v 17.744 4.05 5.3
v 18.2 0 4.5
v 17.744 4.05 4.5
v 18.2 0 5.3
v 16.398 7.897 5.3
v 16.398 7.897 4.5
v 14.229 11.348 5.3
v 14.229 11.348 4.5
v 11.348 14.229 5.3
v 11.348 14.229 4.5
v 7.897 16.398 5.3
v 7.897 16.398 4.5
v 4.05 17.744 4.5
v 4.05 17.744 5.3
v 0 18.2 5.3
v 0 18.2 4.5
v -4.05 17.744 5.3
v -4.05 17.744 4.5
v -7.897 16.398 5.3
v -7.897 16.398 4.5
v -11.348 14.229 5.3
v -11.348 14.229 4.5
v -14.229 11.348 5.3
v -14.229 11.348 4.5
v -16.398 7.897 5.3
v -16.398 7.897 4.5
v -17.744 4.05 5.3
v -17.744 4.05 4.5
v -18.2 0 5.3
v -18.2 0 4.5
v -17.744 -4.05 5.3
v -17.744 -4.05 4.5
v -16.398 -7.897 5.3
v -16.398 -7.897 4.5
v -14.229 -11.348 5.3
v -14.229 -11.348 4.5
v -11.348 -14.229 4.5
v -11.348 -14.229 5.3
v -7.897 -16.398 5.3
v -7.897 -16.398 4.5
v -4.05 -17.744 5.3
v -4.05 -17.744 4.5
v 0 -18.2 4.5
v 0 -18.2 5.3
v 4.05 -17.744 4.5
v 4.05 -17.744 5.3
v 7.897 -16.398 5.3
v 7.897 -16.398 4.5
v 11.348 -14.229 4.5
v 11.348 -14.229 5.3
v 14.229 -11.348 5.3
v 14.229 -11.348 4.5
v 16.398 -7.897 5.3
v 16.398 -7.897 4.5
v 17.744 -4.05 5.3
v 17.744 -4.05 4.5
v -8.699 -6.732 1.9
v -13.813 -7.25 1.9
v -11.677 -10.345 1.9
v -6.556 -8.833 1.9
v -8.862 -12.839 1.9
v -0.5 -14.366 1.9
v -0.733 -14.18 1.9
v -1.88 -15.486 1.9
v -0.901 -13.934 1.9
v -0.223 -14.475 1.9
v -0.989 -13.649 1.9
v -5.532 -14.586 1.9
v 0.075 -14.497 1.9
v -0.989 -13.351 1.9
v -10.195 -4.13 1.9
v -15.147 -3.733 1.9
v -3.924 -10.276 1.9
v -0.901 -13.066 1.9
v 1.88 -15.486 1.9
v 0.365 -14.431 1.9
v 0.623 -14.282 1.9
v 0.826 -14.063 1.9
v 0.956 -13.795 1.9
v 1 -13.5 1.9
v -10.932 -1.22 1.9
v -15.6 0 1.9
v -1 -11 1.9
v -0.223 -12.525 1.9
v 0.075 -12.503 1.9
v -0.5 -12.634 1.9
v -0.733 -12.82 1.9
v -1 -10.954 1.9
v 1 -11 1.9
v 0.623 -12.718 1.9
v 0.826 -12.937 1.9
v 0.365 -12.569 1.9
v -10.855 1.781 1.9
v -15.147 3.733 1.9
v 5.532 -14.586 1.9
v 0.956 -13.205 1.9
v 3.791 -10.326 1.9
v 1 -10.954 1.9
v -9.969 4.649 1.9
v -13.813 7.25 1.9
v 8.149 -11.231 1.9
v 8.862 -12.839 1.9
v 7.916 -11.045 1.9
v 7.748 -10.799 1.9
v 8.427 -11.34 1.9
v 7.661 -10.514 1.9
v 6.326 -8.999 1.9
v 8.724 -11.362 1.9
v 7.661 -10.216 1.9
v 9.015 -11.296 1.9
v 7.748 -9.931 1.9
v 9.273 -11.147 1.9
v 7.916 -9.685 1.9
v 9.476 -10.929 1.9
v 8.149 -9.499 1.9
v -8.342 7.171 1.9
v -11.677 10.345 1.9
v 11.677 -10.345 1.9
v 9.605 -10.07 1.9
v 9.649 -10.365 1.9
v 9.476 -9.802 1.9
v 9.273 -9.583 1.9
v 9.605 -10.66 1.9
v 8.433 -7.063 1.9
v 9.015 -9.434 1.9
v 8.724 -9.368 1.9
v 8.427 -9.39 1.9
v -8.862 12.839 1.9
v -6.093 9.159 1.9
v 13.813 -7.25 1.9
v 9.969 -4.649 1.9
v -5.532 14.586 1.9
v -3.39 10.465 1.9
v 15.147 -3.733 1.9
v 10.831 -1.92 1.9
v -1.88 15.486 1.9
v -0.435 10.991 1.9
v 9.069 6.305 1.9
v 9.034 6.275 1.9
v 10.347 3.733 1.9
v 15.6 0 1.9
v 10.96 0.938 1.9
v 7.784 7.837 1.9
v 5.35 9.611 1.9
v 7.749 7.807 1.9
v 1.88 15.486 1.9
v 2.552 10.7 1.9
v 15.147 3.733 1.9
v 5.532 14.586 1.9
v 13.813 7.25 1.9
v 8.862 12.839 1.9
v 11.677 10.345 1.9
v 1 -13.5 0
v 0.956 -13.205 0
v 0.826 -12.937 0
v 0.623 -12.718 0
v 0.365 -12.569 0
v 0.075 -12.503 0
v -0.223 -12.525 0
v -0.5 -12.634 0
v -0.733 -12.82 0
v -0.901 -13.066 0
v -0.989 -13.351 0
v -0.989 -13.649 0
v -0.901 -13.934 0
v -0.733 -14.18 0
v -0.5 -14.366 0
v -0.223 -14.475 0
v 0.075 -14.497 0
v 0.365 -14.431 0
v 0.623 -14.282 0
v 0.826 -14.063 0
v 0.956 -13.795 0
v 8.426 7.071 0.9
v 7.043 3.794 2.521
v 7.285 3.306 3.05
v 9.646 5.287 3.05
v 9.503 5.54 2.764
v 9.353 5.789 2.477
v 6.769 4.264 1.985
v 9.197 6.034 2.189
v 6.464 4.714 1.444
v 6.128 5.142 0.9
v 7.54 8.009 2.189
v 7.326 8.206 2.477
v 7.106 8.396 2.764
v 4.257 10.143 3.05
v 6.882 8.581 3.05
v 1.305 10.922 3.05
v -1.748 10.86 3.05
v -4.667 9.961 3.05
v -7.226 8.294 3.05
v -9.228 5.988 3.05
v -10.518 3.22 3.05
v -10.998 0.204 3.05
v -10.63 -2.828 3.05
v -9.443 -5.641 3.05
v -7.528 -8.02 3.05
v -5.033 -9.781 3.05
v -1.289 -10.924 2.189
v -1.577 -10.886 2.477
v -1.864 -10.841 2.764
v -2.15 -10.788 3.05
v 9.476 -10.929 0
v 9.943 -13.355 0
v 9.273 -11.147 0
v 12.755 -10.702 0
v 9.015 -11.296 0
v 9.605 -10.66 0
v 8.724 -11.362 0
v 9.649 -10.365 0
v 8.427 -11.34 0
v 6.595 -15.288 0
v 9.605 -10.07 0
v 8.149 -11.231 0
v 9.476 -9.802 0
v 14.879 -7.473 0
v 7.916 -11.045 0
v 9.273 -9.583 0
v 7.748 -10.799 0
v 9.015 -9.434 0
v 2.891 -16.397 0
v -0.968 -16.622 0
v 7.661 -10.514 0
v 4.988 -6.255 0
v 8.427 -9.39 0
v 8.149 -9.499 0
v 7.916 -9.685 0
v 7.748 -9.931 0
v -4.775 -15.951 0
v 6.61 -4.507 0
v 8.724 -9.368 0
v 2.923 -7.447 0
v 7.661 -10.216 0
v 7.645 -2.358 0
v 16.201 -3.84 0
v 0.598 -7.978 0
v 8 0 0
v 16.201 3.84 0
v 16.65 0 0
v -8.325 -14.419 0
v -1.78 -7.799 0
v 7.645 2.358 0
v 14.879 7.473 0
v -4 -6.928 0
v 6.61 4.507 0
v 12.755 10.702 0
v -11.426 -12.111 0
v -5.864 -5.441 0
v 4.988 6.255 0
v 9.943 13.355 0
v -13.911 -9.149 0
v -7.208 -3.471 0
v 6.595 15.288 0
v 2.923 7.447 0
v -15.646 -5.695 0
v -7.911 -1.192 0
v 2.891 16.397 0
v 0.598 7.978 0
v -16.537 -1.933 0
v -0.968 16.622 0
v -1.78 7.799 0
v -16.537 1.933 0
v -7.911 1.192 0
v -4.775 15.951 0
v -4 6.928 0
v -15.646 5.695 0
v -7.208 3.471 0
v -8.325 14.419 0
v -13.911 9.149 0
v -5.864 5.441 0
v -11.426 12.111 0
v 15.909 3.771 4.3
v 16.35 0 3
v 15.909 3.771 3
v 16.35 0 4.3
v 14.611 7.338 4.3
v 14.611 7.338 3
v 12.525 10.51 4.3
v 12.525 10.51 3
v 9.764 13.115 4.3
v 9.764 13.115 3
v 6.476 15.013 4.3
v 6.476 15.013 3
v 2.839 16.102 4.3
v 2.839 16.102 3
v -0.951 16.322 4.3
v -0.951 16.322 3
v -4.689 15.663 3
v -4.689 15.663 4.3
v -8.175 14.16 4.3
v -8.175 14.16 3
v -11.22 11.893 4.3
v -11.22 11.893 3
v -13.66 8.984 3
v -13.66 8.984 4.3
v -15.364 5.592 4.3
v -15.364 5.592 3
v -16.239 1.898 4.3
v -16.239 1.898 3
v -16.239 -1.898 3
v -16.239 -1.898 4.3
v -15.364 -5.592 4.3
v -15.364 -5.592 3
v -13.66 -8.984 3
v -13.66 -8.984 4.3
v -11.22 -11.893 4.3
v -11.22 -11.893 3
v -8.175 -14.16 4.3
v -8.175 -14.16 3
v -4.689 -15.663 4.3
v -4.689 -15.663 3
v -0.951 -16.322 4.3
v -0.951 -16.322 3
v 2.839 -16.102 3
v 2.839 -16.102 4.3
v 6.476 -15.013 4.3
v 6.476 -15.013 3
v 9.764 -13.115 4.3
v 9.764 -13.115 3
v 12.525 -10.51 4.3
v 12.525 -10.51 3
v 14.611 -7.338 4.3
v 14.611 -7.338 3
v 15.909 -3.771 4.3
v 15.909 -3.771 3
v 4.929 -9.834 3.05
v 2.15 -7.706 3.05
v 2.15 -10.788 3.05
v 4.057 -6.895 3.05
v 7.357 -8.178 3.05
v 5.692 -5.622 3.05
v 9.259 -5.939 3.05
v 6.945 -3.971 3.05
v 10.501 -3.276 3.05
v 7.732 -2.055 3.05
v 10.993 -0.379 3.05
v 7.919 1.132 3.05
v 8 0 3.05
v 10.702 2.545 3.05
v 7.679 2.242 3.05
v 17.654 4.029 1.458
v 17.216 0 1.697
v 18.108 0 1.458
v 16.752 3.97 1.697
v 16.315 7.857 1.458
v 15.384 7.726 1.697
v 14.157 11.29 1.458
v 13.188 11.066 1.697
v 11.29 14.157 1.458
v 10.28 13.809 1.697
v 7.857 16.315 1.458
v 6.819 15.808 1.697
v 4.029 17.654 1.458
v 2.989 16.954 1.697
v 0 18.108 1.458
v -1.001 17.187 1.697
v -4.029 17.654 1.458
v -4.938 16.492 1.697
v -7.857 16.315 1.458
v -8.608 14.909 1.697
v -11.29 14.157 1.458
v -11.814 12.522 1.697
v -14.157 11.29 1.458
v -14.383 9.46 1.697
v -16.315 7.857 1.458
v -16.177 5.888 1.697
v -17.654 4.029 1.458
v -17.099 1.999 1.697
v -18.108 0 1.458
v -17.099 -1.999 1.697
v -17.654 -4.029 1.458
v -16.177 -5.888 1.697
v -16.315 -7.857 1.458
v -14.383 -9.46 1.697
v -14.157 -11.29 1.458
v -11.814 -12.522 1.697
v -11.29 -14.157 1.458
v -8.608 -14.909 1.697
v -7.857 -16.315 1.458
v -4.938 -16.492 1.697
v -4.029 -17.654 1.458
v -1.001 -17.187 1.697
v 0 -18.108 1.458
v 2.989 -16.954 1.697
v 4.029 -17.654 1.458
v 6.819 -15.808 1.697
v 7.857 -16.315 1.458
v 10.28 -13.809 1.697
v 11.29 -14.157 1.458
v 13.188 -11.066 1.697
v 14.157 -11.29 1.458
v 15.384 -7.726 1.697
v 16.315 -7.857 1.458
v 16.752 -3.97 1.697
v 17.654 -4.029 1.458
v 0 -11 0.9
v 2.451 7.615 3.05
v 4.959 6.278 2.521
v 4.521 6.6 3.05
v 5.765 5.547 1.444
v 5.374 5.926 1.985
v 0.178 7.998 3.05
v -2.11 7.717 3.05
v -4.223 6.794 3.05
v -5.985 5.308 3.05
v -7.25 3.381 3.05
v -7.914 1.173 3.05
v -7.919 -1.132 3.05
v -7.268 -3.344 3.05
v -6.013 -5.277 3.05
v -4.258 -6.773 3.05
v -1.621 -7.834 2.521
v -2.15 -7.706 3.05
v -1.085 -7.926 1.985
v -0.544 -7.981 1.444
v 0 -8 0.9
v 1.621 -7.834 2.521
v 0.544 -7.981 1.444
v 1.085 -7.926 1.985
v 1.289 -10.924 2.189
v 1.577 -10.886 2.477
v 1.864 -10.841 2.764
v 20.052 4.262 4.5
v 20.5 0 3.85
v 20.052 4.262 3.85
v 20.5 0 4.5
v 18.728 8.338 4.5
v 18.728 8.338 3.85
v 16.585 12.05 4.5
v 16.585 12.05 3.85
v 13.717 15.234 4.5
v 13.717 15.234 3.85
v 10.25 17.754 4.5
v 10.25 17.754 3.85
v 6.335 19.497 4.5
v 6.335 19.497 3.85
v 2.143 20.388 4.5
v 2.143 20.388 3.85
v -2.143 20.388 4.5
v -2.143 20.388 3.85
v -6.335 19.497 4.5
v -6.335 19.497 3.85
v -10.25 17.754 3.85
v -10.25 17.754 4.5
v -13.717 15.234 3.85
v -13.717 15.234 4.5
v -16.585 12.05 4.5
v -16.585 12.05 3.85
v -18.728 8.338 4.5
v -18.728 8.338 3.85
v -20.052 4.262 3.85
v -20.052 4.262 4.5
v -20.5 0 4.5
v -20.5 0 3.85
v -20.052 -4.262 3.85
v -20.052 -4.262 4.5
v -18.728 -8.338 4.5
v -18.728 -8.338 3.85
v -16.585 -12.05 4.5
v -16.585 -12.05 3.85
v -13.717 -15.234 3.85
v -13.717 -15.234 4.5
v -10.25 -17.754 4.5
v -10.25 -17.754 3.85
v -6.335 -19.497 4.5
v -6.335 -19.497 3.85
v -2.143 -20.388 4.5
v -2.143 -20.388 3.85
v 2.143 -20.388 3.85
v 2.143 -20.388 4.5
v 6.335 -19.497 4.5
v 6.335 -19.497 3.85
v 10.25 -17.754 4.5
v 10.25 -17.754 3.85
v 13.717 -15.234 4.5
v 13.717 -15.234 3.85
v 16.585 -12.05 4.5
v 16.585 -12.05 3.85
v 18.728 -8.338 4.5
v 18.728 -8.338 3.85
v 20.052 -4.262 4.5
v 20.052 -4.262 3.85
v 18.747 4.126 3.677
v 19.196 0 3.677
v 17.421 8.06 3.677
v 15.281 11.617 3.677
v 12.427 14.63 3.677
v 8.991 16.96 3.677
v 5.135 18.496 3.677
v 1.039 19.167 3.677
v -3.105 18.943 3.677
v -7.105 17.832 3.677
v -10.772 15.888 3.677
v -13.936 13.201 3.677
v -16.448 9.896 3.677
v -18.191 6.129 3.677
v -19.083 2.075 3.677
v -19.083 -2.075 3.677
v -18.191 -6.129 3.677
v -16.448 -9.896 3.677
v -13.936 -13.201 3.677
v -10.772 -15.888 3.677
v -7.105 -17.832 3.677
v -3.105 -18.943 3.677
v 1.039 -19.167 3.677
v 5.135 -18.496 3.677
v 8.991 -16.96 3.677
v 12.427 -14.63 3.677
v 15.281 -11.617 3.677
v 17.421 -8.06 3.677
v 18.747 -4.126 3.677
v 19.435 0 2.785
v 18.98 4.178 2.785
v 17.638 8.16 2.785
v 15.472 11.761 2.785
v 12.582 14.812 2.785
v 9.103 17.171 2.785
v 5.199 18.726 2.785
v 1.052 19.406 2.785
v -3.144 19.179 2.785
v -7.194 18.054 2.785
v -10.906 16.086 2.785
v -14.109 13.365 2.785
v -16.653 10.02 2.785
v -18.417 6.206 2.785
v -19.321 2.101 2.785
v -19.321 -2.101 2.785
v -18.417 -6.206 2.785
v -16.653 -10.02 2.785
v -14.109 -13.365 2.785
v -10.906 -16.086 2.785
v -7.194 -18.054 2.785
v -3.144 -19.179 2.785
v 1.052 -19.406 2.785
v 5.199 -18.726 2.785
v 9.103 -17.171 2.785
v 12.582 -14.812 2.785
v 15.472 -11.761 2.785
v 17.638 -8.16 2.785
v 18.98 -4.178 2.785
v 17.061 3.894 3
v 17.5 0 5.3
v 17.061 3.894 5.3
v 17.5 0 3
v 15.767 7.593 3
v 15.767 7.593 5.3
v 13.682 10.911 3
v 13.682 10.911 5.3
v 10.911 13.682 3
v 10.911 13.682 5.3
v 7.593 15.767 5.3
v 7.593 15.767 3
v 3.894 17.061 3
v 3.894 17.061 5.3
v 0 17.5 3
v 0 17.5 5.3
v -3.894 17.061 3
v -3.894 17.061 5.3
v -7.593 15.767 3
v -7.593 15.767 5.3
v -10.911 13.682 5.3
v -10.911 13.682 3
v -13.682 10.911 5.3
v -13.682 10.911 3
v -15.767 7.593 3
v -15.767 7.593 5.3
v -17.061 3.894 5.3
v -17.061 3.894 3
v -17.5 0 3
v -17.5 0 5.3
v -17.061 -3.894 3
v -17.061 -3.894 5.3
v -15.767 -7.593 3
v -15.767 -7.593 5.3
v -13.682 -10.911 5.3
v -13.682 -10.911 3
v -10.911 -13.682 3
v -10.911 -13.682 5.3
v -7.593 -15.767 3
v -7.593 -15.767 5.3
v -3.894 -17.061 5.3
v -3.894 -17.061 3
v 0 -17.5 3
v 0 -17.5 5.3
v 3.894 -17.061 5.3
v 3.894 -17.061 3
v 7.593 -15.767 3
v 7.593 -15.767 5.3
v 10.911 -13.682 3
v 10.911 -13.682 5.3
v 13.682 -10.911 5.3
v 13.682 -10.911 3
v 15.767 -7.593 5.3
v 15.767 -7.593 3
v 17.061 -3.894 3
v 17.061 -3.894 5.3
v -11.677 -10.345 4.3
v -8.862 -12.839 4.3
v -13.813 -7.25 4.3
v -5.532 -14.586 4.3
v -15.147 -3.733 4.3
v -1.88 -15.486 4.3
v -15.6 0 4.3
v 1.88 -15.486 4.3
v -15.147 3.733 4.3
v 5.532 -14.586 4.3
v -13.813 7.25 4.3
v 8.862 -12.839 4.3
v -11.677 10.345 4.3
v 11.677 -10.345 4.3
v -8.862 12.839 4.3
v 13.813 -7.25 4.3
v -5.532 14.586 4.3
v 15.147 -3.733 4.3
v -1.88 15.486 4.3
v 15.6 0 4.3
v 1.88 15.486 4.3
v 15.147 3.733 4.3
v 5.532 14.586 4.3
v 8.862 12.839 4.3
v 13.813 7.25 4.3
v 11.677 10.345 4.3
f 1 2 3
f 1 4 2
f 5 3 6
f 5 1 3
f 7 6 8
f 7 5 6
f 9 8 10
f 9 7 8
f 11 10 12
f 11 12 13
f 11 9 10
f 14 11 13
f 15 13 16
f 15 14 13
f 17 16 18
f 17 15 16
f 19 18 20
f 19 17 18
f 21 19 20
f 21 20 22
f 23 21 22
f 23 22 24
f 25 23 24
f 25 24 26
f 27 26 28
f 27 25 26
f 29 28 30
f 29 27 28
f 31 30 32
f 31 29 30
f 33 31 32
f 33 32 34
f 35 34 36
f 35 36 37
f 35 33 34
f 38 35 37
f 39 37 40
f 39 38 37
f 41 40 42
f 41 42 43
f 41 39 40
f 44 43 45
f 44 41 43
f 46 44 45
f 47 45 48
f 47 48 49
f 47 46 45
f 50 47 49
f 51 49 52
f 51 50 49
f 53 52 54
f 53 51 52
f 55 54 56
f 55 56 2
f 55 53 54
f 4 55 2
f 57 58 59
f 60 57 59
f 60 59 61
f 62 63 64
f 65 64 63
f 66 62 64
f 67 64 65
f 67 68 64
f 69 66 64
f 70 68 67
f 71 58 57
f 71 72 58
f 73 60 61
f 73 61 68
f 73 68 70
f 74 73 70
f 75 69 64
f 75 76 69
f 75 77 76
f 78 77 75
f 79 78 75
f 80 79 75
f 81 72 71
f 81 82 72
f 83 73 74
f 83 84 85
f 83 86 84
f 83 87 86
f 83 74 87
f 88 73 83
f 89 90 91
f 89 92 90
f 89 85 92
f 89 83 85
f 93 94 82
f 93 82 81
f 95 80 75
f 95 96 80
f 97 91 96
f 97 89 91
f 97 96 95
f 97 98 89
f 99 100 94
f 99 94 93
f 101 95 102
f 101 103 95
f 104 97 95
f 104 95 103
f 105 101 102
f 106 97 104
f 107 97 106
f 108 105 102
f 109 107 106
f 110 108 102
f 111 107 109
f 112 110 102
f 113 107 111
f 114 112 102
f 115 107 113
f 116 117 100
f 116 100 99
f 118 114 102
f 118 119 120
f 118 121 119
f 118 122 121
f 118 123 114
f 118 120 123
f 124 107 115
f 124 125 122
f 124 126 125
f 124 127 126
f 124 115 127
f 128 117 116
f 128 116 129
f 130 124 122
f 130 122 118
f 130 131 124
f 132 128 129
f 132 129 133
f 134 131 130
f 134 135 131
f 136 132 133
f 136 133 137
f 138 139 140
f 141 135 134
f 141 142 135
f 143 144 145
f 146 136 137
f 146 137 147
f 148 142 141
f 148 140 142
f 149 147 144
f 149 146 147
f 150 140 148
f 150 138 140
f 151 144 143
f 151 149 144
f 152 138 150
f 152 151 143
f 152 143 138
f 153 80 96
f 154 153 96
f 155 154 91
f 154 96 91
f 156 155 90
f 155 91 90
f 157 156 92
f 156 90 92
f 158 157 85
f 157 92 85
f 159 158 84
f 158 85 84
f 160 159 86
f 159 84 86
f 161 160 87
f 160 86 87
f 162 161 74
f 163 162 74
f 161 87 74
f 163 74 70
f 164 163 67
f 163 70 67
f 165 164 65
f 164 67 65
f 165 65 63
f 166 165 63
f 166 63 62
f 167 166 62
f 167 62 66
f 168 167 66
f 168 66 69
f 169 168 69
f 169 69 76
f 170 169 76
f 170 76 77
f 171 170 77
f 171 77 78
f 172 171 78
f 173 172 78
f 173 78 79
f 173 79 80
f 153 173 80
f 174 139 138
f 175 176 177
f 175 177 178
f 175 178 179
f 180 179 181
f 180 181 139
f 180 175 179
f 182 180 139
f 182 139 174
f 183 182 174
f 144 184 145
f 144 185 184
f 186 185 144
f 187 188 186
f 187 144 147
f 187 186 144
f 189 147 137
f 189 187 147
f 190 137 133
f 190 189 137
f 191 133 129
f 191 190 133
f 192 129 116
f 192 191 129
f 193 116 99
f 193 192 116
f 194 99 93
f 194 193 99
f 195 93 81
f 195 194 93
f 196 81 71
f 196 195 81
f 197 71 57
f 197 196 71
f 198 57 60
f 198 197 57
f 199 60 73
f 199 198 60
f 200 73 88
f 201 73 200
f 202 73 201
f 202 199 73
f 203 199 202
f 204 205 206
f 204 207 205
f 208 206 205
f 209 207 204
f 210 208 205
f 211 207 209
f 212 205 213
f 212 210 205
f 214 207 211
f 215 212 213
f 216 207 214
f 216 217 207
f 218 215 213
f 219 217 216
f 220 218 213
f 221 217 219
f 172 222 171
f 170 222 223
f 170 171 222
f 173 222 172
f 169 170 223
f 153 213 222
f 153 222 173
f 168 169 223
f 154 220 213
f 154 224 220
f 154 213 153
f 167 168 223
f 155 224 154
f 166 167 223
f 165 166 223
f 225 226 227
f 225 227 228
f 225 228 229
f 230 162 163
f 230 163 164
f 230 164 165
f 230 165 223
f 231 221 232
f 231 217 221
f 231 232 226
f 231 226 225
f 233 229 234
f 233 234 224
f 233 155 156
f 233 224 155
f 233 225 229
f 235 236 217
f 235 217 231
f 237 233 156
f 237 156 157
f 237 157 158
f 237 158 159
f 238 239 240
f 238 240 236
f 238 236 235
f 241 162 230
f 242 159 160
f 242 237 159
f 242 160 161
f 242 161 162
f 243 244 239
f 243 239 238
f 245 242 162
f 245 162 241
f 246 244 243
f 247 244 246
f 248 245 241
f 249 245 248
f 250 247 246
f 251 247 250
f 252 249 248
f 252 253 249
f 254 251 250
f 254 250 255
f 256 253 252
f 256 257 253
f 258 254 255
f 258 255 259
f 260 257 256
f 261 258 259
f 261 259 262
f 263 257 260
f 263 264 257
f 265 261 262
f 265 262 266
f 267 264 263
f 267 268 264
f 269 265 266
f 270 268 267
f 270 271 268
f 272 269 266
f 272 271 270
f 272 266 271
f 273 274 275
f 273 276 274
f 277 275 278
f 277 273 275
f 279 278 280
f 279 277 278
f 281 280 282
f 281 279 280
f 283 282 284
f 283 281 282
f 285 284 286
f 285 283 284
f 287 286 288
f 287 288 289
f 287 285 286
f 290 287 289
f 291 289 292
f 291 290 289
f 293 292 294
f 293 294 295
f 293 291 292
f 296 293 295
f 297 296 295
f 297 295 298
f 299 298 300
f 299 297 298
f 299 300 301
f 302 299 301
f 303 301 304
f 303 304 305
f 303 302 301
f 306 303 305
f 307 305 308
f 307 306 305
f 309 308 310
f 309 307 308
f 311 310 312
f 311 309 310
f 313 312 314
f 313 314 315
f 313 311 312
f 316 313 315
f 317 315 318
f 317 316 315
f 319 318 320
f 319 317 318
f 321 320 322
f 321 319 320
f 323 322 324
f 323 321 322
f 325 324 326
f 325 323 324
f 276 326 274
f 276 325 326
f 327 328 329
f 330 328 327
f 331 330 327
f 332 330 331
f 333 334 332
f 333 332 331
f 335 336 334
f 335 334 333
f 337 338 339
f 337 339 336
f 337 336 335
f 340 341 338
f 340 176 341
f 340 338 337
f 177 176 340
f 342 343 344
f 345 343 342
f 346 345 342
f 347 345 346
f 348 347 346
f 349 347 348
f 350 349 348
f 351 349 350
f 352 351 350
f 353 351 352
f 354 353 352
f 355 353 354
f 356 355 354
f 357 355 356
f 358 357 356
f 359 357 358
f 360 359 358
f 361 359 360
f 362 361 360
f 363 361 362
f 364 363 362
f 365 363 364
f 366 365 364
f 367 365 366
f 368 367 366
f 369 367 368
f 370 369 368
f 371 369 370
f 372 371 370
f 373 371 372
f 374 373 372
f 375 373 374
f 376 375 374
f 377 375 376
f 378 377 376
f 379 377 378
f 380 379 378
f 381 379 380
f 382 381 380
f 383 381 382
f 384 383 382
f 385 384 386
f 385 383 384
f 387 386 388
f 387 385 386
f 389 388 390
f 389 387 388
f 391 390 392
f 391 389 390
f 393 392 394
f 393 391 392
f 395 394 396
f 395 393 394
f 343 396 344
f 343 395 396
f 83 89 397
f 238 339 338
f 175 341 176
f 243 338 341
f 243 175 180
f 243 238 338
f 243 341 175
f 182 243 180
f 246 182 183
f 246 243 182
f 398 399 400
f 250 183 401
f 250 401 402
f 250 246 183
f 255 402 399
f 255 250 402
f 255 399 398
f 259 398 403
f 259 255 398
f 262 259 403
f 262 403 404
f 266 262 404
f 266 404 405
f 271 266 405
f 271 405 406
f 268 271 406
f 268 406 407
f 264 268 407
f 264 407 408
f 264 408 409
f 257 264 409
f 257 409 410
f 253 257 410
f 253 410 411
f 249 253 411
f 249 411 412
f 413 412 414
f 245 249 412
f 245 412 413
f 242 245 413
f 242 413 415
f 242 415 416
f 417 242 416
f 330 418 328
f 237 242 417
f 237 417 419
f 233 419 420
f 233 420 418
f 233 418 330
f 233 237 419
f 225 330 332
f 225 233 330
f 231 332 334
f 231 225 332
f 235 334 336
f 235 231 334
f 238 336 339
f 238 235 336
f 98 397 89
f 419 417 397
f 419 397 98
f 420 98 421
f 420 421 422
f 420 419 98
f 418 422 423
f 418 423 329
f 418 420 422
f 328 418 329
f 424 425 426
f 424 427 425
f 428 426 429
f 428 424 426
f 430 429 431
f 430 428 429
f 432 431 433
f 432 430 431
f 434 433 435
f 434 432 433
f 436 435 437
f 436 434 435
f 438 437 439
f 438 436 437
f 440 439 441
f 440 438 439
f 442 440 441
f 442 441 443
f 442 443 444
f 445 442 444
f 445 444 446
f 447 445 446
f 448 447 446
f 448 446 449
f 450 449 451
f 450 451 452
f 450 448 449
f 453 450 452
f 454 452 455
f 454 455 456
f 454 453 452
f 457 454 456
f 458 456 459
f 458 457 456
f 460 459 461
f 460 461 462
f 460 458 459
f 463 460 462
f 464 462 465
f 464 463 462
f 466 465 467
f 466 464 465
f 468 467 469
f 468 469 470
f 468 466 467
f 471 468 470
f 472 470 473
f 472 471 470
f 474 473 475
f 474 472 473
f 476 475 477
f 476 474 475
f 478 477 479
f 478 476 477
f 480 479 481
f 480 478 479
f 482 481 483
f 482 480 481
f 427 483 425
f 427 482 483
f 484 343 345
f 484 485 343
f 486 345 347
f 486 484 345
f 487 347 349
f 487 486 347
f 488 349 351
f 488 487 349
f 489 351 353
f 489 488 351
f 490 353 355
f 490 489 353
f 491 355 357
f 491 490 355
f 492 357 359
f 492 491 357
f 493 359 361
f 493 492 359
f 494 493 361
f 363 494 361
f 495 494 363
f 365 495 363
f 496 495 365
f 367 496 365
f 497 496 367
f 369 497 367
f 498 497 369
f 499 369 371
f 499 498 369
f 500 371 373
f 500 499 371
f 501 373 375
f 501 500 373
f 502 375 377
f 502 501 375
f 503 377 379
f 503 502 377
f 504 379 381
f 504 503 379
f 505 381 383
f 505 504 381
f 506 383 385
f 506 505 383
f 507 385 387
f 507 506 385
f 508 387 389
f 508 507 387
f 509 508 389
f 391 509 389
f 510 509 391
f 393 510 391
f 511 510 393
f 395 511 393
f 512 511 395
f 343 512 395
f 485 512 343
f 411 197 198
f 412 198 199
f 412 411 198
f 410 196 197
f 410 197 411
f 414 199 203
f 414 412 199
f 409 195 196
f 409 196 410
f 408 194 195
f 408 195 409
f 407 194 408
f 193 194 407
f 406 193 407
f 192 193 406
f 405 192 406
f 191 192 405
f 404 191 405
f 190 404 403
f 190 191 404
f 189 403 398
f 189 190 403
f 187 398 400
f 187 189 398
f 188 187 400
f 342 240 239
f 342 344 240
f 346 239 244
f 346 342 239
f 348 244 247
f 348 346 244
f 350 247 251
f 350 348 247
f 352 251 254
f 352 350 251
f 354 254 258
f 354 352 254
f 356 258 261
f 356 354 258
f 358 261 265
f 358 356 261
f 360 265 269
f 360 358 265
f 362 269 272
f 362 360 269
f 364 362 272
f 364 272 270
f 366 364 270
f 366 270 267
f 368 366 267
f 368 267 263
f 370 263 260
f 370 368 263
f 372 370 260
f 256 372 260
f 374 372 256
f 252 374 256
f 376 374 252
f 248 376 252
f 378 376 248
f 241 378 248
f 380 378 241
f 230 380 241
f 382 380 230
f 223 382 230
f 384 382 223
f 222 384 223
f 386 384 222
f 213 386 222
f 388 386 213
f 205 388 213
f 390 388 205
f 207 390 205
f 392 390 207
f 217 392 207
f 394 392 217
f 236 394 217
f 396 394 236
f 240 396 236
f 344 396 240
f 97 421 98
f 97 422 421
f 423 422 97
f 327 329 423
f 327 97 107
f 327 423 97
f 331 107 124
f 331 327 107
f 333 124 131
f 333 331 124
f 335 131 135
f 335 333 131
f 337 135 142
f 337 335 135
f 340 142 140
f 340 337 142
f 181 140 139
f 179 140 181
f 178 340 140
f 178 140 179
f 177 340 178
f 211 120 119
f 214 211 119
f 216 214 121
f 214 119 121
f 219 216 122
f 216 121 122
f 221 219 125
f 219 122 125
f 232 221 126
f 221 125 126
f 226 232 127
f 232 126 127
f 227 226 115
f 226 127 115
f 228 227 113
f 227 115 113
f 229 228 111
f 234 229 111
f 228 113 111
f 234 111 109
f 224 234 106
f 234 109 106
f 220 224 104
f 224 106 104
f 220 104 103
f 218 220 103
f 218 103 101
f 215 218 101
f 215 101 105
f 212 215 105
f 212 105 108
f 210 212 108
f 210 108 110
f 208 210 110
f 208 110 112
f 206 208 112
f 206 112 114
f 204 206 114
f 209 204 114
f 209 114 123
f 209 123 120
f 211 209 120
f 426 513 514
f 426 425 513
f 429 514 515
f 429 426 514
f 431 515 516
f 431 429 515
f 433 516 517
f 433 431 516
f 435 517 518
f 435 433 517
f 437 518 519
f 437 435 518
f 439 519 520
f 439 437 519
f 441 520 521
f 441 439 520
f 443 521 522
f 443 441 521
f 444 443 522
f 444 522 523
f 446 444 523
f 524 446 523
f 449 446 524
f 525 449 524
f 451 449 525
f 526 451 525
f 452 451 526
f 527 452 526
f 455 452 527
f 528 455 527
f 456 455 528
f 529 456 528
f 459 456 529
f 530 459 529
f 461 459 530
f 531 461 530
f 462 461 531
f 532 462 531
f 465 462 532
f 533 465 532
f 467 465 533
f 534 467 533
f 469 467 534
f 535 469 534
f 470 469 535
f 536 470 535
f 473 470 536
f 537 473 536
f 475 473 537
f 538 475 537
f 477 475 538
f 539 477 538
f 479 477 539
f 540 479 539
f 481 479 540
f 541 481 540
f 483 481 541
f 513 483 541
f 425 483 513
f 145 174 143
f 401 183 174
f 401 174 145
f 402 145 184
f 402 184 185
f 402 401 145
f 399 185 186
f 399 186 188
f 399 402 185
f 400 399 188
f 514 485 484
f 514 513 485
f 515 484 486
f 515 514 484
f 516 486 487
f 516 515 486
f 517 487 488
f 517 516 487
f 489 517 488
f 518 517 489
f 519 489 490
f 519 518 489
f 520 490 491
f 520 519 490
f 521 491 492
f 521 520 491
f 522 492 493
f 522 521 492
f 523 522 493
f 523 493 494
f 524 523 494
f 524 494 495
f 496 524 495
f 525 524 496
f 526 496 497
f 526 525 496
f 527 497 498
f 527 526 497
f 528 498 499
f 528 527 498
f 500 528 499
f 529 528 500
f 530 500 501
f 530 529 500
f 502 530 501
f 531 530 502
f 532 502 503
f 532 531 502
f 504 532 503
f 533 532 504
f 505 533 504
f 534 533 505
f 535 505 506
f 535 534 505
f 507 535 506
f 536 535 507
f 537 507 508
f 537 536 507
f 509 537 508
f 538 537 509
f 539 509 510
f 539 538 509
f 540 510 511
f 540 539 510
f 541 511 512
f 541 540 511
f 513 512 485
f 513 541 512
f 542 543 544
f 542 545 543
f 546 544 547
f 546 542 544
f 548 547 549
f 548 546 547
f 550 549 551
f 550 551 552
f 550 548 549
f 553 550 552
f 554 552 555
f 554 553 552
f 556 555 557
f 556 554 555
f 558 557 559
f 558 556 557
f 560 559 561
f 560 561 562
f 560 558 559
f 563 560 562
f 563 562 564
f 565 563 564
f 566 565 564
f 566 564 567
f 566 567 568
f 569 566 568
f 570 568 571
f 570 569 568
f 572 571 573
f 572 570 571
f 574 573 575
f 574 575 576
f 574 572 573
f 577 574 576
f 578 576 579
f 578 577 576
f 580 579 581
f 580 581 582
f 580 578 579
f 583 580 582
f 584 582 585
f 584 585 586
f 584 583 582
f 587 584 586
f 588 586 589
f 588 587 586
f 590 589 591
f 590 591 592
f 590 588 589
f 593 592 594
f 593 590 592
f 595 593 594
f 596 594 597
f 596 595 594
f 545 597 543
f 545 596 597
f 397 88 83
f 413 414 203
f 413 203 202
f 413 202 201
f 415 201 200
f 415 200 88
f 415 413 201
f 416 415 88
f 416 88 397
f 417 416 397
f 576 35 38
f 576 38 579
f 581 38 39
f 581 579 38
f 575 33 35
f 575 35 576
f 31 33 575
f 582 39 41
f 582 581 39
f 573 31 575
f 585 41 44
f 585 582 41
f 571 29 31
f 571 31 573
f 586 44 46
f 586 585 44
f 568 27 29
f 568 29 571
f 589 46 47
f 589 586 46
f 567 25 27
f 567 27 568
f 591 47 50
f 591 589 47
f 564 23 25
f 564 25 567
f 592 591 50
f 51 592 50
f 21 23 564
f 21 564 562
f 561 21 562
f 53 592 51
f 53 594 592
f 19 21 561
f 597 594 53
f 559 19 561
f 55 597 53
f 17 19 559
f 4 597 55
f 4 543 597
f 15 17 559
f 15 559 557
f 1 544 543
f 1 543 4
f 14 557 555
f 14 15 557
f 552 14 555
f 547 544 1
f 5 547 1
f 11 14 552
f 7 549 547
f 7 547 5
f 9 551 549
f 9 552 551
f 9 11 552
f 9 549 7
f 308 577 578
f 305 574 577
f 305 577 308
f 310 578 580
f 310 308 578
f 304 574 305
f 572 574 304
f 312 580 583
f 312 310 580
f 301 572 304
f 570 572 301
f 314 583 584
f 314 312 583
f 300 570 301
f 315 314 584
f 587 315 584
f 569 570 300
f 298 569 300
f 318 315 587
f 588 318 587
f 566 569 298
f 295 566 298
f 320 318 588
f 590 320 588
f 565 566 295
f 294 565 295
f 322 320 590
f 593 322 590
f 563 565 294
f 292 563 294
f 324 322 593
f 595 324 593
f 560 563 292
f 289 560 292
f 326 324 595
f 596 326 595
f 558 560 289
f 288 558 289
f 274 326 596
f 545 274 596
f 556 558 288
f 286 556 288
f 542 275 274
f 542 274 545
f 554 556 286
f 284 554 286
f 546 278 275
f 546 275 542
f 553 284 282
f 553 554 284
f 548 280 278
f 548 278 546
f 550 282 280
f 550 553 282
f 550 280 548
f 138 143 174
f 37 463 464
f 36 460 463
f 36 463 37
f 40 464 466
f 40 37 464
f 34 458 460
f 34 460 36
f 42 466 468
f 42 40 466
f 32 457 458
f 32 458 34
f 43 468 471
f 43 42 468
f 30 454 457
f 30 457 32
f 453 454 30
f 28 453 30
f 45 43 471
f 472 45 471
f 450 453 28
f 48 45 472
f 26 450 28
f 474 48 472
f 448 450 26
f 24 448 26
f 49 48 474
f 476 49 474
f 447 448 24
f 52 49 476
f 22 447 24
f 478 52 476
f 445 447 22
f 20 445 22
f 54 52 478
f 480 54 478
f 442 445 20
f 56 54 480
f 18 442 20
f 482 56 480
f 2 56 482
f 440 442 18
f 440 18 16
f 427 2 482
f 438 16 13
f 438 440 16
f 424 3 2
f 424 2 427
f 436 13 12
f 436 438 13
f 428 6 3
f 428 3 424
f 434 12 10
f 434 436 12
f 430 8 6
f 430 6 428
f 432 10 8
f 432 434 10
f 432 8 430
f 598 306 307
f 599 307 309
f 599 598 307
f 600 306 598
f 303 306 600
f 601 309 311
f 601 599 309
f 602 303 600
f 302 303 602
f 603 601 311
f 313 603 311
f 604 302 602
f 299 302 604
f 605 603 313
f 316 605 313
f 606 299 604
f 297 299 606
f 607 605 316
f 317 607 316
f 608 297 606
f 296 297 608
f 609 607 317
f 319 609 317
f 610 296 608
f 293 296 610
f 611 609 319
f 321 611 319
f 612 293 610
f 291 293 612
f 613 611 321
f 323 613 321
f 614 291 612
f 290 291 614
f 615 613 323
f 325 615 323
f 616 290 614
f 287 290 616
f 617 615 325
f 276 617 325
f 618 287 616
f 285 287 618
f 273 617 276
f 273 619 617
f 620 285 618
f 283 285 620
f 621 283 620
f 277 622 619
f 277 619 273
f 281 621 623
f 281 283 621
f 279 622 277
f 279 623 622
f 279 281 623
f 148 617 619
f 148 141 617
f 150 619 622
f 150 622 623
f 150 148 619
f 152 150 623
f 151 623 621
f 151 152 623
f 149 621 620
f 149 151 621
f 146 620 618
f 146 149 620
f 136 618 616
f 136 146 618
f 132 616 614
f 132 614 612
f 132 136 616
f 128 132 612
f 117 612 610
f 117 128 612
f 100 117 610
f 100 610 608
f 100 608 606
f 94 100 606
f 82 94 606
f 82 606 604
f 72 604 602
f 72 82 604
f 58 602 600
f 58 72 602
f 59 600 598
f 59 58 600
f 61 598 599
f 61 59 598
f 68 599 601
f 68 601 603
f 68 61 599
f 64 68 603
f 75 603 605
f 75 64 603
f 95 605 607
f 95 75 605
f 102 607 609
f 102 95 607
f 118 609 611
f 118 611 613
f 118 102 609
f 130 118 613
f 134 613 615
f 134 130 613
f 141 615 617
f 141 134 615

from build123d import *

# Parameters (mm, degrees)
F5_COUNT = 2
F5_ANGLE = 130
F7_R     = 1
F8_DEPTH = 1.901


with BuildPart() as f1:
    # F0 (on Front) → F1 (revolve)
    with BuildSketch(Plane.XZ):
        Polygon((8, 3.05), (8, 0), (16.65, 0), (18.107969, 1.457969), (17.215685, 1.697056), (19.195584, 3.676955), (19.434671, 2.784671), (20.5, 3.85), (20.5, 4.5), (18.2, 4.5), (18.2, 5.3), (17.5, 5.3), (17.5, 3), (16.35, 3), (16.35, 4.3), (15.6, 4.3), (15.6, 1.9), (11, 1.9), (11, 3.05), align=None)
    revolve(axis=Axis((0, 0, 2.65), (0, 0, 1)))


with BuildPart() as f4:
    # F4: sweep along a path in F3
    with BuildLine(Plane.XY.offset(3.05)) as f4_path:
        Line((0, -11), (0, 0))
    # F2 (on Front) → F4 (sweep)
    with BuildSketch(Plane.XZ):
        Polygon((-2.15, 3.05), (0, 0.9), (2.15, 3.05), align=None)
    sweep(path=f4_path.line)


with BuildPart() as f5_1:
    # F5: instance of F4
    add(f4.part.rotate(Axis((0, 0, 2.65), (0, 0, 1)), 1 * F5_ANGLE / (F5_COUNT - 1)))


with BuildPart() as f1_1:
    add(f1.part)

    # F6: cut F4, F5_1
    add(f4.part, mode=Mode.SUBTRACT)
    add(f5_1.part, mode=Mode.SUBTRACT)

    # F7 (on face) → F8 (cut, through all)
    with BuildSketch(Plane.XY.offset(1.9)):
        with Locations((0, -13.5)):
            Circle(F7_R)
        with Locations((8.649447, -10.365185)):
            Circle(F7_R)
    extrude(amount=-F8_DEPTH, mode=Mode.SUBTRACT)


solid = f1_1.part
